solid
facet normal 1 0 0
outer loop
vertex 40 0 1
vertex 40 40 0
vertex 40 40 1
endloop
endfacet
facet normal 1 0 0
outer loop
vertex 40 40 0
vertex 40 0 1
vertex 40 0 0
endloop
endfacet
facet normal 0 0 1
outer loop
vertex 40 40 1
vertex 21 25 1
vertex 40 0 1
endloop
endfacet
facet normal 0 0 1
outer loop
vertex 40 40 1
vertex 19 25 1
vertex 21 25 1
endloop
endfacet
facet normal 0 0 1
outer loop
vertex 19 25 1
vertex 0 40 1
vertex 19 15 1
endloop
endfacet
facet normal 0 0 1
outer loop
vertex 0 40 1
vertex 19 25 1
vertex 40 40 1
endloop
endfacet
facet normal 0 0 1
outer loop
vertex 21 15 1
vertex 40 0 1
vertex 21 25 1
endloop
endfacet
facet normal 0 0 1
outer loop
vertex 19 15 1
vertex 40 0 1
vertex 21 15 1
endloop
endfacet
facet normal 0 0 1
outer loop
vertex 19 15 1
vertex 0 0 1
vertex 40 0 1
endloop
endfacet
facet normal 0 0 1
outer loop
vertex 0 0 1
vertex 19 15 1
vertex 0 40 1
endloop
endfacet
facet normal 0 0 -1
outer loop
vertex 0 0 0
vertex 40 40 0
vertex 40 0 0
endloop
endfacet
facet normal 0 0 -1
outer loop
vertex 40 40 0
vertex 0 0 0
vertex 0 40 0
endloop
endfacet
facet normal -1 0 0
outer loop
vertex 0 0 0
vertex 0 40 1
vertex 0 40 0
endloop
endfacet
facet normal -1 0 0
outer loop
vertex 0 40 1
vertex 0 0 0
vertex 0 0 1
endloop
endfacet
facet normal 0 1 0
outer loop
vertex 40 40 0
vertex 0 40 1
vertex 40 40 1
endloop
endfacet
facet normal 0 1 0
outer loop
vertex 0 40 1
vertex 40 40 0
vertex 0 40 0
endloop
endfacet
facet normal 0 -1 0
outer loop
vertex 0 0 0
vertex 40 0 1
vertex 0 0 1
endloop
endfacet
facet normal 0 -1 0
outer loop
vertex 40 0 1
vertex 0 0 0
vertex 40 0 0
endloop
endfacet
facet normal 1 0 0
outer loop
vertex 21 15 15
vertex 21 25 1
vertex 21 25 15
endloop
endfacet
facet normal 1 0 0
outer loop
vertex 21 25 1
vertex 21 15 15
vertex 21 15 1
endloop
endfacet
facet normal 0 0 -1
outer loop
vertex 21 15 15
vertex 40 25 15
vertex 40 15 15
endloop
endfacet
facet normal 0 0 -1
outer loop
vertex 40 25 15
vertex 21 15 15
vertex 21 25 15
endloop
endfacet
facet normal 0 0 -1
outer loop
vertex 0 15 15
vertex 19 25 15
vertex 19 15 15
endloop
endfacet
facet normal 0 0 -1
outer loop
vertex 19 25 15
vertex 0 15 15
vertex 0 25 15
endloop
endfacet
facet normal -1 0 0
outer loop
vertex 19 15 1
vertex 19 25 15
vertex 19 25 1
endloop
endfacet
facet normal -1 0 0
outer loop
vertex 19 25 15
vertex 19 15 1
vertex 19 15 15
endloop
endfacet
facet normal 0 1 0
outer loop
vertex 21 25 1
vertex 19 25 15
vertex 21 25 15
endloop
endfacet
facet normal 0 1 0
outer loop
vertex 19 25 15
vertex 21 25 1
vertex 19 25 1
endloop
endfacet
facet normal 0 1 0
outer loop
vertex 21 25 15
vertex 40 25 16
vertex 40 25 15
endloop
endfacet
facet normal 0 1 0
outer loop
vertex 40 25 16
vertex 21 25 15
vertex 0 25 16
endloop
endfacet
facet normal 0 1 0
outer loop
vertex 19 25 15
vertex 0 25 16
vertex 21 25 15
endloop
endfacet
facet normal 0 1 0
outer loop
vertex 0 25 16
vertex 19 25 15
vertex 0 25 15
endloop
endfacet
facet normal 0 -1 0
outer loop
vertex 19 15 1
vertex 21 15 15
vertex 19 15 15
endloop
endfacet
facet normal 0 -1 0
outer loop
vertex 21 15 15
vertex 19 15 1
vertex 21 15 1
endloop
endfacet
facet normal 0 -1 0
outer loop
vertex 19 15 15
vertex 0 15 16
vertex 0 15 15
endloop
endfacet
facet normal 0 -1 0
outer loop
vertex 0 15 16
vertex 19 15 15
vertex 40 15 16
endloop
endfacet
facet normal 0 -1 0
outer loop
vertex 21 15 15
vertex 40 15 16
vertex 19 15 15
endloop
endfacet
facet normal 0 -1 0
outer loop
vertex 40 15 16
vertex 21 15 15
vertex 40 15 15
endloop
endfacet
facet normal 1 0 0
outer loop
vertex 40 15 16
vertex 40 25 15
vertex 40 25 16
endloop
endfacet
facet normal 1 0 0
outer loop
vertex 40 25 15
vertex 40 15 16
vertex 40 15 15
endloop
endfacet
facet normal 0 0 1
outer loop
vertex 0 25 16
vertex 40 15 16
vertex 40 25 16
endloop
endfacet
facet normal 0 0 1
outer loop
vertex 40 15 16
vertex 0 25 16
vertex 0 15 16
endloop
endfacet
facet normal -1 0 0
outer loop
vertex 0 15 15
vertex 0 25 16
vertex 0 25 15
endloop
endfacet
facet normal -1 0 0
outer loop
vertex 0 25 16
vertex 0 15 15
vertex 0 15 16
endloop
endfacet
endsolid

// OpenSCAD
cube([40, 40, 1]);
translate([19, 15, 0])
	cube([2, 10, 15]);
translate([0, 15, 15])
	cube([40, 10, 1]);
